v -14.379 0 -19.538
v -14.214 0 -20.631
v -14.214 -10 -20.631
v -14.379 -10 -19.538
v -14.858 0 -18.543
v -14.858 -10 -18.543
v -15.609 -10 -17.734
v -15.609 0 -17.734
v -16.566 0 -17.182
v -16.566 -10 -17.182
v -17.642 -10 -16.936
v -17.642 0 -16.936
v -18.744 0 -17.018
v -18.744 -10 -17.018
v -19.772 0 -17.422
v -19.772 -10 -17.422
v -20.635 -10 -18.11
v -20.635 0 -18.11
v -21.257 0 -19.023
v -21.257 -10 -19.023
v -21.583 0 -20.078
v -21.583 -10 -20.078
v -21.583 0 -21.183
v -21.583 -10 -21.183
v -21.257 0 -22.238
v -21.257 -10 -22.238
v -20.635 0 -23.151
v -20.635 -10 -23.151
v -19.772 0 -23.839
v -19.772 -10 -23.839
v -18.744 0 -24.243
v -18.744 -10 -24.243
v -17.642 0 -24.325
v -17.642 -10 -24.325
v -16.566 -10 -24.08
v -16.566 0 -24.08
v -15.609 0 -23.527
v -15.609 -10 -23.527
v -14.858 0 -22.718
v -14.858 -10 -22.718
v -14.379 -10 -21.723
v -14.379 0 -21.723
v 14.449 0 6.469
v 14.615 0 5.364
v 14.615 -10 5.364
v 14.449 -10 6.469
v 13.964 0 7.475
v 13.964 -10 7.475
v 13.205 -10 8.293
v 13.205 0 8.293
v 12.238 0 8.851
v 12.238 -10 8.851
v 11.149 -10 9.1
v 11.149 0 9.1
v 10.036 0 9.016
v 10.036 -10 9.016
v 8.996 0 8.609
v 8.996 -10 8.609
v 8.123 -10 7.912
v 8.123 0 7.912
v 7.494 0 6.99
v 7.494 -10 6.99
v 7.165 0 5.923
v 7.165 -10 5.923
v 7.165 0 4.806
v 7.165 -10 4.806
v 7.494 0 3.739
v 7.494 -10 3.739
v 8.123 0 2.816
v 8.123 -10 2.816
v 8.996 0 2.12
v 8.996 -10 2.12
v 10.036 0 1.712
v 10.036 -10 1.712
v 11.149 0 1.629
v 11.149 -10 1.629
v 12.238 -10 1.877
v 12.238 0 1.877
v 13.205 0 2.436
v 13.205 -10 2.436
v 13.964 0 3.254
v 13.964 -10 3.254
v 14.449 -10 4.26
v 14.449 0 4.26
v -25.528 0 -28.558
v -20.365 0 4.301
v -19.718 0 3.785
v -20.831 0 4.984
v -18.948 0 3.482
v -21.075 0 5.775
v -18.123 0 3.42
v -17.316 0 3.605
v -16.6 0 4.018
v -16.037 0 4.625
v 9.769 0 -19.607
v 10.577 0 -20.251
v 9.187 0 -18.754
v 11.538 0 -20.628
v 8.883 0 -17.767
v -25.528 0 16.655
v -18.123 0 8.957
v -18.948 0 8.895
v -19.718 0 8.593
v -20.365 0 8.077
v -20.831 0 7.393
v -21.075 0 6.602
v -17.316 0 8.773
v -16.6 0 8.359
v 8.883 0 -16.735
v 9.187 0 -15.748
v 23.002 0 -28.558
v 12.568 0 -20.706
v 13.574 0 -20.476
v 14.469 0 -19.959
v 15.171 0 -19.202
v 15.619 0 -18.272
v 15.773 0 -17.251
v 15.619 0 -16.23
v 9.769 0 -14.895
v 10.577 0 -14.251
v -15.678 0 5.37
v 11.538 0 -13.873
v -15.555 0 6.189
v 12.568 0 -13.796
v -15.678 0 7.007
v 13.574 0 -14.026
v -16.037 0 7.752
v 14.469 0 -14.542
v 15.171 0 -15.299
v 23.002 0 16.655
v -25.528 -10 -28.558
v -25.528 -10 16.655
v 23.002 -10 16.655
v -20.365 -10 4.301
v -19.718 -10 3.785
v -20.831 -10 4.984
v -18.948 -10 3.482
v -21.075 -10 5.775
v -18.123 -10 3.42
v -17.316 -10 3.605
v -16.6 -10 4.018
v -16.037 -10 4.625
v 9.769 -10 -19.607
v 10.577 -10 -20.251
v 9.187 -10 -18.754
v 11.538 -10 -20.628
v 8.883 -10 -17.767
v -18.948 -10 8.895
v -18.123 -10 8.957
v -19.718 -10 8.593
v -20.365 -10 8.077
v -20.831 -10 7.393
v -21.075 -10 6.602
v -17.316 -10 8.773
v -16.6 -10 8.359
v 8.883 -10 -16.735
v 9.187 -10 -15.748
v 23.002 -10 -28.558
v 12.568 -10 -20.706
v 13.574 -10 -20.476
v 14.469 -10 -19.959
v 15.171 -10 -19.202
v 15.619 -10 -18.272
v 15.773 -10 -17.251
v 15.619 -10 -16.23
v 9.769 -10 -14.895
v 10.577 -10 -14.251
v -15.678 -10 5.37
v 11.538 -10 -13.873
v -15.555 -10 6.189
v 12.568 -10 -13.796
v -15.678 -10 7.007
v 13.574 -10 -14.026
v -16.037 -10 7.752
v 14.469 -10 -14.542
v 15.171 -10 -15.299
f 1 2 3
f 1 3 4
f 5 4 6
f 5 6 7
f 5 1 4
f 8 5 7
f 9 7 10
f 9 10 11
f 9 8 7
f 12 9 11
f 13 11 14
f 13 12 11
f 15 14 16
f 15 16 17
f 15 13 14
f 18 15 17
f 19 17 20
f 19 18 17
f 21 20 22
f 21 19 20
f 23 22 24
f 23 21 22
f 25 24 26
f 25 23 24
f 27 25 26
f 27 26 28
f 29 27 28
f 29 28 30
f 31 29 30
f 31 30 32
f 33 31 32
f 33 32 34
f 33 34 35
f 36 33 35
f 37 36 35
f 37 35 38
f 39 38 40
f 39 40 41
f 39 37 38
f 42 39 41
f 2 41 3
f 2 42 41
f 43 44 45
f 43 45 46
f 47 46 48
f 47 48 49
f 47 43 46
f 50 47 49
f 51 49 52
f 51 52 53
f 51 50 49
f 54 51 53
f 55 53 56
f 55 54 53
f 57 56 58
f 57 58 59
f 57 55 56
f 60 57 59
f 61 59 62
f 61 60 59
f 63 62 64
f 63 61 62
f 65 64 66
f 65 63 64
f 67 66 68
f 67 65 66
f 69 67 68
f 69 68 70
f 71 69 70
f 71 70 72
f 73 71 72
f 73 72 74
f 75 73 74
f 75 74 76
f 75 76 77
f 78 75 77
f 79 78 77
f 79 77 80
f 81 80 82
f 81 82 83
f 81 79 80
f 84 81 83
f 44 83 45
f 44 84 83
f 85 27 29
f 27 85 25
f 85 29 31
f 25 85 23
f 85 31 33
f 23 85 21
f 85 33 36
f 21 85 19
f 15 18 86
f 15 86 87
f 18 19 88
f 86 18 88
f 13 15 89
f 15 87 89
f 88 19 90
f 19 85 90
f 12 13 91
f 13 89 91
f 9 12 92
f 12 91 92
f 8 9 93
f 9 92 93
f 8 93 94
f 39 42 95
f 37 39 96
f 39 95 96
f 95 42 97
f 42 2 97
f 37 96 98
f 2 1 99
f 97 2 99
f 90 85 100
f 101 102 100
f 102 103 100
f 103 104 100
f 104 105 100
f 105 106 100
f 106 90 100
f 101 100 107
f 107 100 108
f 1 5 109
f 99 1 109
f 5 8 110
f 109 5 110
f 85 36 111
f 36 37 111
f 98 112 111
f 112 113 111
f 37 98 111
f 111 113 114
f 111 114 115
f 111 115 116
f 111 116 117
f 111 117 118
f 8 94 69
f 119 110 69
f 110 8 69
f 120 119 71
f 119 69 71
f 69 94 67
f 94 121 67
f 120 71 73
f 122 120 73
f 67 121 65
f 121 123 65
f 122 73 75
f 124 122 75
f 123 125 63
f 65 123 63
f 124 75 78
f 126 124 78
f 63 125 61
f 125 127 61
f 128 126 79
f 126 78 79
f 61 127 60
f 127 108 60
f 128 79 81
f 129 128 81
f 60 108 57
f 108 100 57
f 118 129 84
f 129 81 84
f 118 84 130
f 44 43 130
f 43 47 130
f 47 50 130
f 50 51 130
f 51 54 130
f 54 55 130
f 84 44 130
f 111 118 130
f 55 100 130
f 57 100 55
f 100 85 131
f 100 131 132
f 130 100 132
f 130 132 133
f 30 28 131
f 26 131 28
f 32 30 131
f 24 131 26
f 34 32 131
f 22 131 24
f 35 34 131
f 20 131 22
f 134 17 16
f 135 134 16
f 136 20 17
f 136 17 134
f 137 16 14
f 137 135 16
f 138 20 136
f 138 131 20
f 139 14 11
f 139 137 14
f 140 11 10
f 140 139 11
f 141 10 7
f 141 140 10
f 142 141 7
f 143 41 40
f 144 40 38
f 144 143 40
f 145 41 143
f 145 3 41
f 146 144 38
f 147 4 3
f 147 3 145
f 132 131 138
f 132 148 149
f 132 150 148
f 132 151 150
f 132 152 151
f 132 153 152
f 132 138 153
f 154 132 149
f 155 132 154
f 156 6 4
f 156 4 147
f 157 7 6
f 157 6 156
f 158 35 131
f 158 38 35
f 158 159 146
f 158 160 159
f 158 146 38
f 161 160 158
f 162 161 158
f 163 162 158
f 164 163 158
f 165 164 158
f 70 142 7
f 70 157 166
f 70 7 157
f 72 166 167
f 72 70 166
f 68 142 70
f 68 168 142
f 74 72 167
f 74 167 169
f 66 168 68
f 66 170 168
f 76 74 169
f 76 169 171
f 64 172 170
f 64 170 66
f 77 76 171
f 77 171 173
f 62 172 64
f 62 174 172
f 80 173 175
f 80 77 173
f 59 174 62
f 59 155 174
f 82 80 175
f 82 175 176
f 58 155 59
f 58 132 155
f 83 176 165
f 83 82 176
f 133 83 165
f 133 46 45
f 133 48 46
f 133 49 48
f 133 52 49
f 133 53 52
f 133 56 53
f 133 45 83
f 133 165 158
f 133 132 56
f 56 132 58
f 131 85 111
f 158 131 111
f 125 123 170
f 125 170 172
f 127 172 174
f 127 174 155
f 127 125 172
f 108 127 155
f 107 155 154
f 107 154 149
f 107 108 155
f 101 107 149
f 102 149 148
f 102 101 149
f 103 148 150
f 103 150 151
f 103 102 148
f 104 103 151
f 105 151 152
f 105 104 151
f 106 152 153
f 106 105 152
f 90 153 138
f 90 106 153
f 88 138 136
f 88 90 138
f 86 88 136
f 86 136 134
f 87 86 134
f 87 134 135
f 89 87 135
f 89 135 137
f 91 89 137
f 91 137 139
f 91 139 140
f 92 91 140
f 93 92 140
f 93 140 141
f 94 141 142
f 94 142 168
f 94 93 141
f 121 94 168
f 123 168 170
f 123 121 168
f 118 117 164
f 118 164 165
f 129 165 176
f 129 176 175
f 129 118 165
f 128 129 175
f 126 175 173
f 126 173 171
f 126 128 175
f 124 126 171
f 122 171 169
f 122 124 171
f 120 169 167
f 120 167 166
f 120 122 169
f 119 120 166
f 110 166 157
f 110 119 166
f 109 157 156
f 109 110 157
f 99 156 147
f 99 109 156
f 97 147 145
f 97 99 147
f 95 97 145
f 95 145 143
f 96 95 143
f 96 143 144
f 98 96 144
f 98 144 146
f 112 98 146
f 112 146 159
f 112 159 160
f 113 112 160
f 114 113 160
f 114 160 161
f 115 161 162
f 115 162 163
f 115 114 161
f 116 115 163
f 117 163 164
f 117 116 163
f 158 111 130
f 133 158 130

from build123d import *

# Parameters (mm, degrees)
F0_W     = 48.529239
F0_H     = 45.212935
F0_R     = 3.705071
F0_R_2   = 3.464323
F0_R_3   = 2.775839
F0_R_4   = 3.746018
F1_DEPTH = 10


with BuildPart() as f1:
    # F0 (on Front) → F1 (new body)
    with BuildSketch(Plane.XZ):
        with Locations((-1.263026, -5.951959)):
            Rectangle(F0_W, F0_H)
        with Locations((-17.919248, -20.630553)):
            Circle(F0_R, mode=Mode.SUBTRACT)
        with Locations((12.308709, -17.250935)):
            Circle(F0_R_2, mode=Mode.SUBTRACT)
        with Locations((-18.330511, 6.188568)):
            Circle(F0_R_3, mode=Mode.SUBTRACT)
        with Locations((10.869283, 5.364367)):
            Circle(F0_R_4, mode=Mode.SUBTRACT)
    extrude(amount=F1_DEPTH)


solid = f1.part
